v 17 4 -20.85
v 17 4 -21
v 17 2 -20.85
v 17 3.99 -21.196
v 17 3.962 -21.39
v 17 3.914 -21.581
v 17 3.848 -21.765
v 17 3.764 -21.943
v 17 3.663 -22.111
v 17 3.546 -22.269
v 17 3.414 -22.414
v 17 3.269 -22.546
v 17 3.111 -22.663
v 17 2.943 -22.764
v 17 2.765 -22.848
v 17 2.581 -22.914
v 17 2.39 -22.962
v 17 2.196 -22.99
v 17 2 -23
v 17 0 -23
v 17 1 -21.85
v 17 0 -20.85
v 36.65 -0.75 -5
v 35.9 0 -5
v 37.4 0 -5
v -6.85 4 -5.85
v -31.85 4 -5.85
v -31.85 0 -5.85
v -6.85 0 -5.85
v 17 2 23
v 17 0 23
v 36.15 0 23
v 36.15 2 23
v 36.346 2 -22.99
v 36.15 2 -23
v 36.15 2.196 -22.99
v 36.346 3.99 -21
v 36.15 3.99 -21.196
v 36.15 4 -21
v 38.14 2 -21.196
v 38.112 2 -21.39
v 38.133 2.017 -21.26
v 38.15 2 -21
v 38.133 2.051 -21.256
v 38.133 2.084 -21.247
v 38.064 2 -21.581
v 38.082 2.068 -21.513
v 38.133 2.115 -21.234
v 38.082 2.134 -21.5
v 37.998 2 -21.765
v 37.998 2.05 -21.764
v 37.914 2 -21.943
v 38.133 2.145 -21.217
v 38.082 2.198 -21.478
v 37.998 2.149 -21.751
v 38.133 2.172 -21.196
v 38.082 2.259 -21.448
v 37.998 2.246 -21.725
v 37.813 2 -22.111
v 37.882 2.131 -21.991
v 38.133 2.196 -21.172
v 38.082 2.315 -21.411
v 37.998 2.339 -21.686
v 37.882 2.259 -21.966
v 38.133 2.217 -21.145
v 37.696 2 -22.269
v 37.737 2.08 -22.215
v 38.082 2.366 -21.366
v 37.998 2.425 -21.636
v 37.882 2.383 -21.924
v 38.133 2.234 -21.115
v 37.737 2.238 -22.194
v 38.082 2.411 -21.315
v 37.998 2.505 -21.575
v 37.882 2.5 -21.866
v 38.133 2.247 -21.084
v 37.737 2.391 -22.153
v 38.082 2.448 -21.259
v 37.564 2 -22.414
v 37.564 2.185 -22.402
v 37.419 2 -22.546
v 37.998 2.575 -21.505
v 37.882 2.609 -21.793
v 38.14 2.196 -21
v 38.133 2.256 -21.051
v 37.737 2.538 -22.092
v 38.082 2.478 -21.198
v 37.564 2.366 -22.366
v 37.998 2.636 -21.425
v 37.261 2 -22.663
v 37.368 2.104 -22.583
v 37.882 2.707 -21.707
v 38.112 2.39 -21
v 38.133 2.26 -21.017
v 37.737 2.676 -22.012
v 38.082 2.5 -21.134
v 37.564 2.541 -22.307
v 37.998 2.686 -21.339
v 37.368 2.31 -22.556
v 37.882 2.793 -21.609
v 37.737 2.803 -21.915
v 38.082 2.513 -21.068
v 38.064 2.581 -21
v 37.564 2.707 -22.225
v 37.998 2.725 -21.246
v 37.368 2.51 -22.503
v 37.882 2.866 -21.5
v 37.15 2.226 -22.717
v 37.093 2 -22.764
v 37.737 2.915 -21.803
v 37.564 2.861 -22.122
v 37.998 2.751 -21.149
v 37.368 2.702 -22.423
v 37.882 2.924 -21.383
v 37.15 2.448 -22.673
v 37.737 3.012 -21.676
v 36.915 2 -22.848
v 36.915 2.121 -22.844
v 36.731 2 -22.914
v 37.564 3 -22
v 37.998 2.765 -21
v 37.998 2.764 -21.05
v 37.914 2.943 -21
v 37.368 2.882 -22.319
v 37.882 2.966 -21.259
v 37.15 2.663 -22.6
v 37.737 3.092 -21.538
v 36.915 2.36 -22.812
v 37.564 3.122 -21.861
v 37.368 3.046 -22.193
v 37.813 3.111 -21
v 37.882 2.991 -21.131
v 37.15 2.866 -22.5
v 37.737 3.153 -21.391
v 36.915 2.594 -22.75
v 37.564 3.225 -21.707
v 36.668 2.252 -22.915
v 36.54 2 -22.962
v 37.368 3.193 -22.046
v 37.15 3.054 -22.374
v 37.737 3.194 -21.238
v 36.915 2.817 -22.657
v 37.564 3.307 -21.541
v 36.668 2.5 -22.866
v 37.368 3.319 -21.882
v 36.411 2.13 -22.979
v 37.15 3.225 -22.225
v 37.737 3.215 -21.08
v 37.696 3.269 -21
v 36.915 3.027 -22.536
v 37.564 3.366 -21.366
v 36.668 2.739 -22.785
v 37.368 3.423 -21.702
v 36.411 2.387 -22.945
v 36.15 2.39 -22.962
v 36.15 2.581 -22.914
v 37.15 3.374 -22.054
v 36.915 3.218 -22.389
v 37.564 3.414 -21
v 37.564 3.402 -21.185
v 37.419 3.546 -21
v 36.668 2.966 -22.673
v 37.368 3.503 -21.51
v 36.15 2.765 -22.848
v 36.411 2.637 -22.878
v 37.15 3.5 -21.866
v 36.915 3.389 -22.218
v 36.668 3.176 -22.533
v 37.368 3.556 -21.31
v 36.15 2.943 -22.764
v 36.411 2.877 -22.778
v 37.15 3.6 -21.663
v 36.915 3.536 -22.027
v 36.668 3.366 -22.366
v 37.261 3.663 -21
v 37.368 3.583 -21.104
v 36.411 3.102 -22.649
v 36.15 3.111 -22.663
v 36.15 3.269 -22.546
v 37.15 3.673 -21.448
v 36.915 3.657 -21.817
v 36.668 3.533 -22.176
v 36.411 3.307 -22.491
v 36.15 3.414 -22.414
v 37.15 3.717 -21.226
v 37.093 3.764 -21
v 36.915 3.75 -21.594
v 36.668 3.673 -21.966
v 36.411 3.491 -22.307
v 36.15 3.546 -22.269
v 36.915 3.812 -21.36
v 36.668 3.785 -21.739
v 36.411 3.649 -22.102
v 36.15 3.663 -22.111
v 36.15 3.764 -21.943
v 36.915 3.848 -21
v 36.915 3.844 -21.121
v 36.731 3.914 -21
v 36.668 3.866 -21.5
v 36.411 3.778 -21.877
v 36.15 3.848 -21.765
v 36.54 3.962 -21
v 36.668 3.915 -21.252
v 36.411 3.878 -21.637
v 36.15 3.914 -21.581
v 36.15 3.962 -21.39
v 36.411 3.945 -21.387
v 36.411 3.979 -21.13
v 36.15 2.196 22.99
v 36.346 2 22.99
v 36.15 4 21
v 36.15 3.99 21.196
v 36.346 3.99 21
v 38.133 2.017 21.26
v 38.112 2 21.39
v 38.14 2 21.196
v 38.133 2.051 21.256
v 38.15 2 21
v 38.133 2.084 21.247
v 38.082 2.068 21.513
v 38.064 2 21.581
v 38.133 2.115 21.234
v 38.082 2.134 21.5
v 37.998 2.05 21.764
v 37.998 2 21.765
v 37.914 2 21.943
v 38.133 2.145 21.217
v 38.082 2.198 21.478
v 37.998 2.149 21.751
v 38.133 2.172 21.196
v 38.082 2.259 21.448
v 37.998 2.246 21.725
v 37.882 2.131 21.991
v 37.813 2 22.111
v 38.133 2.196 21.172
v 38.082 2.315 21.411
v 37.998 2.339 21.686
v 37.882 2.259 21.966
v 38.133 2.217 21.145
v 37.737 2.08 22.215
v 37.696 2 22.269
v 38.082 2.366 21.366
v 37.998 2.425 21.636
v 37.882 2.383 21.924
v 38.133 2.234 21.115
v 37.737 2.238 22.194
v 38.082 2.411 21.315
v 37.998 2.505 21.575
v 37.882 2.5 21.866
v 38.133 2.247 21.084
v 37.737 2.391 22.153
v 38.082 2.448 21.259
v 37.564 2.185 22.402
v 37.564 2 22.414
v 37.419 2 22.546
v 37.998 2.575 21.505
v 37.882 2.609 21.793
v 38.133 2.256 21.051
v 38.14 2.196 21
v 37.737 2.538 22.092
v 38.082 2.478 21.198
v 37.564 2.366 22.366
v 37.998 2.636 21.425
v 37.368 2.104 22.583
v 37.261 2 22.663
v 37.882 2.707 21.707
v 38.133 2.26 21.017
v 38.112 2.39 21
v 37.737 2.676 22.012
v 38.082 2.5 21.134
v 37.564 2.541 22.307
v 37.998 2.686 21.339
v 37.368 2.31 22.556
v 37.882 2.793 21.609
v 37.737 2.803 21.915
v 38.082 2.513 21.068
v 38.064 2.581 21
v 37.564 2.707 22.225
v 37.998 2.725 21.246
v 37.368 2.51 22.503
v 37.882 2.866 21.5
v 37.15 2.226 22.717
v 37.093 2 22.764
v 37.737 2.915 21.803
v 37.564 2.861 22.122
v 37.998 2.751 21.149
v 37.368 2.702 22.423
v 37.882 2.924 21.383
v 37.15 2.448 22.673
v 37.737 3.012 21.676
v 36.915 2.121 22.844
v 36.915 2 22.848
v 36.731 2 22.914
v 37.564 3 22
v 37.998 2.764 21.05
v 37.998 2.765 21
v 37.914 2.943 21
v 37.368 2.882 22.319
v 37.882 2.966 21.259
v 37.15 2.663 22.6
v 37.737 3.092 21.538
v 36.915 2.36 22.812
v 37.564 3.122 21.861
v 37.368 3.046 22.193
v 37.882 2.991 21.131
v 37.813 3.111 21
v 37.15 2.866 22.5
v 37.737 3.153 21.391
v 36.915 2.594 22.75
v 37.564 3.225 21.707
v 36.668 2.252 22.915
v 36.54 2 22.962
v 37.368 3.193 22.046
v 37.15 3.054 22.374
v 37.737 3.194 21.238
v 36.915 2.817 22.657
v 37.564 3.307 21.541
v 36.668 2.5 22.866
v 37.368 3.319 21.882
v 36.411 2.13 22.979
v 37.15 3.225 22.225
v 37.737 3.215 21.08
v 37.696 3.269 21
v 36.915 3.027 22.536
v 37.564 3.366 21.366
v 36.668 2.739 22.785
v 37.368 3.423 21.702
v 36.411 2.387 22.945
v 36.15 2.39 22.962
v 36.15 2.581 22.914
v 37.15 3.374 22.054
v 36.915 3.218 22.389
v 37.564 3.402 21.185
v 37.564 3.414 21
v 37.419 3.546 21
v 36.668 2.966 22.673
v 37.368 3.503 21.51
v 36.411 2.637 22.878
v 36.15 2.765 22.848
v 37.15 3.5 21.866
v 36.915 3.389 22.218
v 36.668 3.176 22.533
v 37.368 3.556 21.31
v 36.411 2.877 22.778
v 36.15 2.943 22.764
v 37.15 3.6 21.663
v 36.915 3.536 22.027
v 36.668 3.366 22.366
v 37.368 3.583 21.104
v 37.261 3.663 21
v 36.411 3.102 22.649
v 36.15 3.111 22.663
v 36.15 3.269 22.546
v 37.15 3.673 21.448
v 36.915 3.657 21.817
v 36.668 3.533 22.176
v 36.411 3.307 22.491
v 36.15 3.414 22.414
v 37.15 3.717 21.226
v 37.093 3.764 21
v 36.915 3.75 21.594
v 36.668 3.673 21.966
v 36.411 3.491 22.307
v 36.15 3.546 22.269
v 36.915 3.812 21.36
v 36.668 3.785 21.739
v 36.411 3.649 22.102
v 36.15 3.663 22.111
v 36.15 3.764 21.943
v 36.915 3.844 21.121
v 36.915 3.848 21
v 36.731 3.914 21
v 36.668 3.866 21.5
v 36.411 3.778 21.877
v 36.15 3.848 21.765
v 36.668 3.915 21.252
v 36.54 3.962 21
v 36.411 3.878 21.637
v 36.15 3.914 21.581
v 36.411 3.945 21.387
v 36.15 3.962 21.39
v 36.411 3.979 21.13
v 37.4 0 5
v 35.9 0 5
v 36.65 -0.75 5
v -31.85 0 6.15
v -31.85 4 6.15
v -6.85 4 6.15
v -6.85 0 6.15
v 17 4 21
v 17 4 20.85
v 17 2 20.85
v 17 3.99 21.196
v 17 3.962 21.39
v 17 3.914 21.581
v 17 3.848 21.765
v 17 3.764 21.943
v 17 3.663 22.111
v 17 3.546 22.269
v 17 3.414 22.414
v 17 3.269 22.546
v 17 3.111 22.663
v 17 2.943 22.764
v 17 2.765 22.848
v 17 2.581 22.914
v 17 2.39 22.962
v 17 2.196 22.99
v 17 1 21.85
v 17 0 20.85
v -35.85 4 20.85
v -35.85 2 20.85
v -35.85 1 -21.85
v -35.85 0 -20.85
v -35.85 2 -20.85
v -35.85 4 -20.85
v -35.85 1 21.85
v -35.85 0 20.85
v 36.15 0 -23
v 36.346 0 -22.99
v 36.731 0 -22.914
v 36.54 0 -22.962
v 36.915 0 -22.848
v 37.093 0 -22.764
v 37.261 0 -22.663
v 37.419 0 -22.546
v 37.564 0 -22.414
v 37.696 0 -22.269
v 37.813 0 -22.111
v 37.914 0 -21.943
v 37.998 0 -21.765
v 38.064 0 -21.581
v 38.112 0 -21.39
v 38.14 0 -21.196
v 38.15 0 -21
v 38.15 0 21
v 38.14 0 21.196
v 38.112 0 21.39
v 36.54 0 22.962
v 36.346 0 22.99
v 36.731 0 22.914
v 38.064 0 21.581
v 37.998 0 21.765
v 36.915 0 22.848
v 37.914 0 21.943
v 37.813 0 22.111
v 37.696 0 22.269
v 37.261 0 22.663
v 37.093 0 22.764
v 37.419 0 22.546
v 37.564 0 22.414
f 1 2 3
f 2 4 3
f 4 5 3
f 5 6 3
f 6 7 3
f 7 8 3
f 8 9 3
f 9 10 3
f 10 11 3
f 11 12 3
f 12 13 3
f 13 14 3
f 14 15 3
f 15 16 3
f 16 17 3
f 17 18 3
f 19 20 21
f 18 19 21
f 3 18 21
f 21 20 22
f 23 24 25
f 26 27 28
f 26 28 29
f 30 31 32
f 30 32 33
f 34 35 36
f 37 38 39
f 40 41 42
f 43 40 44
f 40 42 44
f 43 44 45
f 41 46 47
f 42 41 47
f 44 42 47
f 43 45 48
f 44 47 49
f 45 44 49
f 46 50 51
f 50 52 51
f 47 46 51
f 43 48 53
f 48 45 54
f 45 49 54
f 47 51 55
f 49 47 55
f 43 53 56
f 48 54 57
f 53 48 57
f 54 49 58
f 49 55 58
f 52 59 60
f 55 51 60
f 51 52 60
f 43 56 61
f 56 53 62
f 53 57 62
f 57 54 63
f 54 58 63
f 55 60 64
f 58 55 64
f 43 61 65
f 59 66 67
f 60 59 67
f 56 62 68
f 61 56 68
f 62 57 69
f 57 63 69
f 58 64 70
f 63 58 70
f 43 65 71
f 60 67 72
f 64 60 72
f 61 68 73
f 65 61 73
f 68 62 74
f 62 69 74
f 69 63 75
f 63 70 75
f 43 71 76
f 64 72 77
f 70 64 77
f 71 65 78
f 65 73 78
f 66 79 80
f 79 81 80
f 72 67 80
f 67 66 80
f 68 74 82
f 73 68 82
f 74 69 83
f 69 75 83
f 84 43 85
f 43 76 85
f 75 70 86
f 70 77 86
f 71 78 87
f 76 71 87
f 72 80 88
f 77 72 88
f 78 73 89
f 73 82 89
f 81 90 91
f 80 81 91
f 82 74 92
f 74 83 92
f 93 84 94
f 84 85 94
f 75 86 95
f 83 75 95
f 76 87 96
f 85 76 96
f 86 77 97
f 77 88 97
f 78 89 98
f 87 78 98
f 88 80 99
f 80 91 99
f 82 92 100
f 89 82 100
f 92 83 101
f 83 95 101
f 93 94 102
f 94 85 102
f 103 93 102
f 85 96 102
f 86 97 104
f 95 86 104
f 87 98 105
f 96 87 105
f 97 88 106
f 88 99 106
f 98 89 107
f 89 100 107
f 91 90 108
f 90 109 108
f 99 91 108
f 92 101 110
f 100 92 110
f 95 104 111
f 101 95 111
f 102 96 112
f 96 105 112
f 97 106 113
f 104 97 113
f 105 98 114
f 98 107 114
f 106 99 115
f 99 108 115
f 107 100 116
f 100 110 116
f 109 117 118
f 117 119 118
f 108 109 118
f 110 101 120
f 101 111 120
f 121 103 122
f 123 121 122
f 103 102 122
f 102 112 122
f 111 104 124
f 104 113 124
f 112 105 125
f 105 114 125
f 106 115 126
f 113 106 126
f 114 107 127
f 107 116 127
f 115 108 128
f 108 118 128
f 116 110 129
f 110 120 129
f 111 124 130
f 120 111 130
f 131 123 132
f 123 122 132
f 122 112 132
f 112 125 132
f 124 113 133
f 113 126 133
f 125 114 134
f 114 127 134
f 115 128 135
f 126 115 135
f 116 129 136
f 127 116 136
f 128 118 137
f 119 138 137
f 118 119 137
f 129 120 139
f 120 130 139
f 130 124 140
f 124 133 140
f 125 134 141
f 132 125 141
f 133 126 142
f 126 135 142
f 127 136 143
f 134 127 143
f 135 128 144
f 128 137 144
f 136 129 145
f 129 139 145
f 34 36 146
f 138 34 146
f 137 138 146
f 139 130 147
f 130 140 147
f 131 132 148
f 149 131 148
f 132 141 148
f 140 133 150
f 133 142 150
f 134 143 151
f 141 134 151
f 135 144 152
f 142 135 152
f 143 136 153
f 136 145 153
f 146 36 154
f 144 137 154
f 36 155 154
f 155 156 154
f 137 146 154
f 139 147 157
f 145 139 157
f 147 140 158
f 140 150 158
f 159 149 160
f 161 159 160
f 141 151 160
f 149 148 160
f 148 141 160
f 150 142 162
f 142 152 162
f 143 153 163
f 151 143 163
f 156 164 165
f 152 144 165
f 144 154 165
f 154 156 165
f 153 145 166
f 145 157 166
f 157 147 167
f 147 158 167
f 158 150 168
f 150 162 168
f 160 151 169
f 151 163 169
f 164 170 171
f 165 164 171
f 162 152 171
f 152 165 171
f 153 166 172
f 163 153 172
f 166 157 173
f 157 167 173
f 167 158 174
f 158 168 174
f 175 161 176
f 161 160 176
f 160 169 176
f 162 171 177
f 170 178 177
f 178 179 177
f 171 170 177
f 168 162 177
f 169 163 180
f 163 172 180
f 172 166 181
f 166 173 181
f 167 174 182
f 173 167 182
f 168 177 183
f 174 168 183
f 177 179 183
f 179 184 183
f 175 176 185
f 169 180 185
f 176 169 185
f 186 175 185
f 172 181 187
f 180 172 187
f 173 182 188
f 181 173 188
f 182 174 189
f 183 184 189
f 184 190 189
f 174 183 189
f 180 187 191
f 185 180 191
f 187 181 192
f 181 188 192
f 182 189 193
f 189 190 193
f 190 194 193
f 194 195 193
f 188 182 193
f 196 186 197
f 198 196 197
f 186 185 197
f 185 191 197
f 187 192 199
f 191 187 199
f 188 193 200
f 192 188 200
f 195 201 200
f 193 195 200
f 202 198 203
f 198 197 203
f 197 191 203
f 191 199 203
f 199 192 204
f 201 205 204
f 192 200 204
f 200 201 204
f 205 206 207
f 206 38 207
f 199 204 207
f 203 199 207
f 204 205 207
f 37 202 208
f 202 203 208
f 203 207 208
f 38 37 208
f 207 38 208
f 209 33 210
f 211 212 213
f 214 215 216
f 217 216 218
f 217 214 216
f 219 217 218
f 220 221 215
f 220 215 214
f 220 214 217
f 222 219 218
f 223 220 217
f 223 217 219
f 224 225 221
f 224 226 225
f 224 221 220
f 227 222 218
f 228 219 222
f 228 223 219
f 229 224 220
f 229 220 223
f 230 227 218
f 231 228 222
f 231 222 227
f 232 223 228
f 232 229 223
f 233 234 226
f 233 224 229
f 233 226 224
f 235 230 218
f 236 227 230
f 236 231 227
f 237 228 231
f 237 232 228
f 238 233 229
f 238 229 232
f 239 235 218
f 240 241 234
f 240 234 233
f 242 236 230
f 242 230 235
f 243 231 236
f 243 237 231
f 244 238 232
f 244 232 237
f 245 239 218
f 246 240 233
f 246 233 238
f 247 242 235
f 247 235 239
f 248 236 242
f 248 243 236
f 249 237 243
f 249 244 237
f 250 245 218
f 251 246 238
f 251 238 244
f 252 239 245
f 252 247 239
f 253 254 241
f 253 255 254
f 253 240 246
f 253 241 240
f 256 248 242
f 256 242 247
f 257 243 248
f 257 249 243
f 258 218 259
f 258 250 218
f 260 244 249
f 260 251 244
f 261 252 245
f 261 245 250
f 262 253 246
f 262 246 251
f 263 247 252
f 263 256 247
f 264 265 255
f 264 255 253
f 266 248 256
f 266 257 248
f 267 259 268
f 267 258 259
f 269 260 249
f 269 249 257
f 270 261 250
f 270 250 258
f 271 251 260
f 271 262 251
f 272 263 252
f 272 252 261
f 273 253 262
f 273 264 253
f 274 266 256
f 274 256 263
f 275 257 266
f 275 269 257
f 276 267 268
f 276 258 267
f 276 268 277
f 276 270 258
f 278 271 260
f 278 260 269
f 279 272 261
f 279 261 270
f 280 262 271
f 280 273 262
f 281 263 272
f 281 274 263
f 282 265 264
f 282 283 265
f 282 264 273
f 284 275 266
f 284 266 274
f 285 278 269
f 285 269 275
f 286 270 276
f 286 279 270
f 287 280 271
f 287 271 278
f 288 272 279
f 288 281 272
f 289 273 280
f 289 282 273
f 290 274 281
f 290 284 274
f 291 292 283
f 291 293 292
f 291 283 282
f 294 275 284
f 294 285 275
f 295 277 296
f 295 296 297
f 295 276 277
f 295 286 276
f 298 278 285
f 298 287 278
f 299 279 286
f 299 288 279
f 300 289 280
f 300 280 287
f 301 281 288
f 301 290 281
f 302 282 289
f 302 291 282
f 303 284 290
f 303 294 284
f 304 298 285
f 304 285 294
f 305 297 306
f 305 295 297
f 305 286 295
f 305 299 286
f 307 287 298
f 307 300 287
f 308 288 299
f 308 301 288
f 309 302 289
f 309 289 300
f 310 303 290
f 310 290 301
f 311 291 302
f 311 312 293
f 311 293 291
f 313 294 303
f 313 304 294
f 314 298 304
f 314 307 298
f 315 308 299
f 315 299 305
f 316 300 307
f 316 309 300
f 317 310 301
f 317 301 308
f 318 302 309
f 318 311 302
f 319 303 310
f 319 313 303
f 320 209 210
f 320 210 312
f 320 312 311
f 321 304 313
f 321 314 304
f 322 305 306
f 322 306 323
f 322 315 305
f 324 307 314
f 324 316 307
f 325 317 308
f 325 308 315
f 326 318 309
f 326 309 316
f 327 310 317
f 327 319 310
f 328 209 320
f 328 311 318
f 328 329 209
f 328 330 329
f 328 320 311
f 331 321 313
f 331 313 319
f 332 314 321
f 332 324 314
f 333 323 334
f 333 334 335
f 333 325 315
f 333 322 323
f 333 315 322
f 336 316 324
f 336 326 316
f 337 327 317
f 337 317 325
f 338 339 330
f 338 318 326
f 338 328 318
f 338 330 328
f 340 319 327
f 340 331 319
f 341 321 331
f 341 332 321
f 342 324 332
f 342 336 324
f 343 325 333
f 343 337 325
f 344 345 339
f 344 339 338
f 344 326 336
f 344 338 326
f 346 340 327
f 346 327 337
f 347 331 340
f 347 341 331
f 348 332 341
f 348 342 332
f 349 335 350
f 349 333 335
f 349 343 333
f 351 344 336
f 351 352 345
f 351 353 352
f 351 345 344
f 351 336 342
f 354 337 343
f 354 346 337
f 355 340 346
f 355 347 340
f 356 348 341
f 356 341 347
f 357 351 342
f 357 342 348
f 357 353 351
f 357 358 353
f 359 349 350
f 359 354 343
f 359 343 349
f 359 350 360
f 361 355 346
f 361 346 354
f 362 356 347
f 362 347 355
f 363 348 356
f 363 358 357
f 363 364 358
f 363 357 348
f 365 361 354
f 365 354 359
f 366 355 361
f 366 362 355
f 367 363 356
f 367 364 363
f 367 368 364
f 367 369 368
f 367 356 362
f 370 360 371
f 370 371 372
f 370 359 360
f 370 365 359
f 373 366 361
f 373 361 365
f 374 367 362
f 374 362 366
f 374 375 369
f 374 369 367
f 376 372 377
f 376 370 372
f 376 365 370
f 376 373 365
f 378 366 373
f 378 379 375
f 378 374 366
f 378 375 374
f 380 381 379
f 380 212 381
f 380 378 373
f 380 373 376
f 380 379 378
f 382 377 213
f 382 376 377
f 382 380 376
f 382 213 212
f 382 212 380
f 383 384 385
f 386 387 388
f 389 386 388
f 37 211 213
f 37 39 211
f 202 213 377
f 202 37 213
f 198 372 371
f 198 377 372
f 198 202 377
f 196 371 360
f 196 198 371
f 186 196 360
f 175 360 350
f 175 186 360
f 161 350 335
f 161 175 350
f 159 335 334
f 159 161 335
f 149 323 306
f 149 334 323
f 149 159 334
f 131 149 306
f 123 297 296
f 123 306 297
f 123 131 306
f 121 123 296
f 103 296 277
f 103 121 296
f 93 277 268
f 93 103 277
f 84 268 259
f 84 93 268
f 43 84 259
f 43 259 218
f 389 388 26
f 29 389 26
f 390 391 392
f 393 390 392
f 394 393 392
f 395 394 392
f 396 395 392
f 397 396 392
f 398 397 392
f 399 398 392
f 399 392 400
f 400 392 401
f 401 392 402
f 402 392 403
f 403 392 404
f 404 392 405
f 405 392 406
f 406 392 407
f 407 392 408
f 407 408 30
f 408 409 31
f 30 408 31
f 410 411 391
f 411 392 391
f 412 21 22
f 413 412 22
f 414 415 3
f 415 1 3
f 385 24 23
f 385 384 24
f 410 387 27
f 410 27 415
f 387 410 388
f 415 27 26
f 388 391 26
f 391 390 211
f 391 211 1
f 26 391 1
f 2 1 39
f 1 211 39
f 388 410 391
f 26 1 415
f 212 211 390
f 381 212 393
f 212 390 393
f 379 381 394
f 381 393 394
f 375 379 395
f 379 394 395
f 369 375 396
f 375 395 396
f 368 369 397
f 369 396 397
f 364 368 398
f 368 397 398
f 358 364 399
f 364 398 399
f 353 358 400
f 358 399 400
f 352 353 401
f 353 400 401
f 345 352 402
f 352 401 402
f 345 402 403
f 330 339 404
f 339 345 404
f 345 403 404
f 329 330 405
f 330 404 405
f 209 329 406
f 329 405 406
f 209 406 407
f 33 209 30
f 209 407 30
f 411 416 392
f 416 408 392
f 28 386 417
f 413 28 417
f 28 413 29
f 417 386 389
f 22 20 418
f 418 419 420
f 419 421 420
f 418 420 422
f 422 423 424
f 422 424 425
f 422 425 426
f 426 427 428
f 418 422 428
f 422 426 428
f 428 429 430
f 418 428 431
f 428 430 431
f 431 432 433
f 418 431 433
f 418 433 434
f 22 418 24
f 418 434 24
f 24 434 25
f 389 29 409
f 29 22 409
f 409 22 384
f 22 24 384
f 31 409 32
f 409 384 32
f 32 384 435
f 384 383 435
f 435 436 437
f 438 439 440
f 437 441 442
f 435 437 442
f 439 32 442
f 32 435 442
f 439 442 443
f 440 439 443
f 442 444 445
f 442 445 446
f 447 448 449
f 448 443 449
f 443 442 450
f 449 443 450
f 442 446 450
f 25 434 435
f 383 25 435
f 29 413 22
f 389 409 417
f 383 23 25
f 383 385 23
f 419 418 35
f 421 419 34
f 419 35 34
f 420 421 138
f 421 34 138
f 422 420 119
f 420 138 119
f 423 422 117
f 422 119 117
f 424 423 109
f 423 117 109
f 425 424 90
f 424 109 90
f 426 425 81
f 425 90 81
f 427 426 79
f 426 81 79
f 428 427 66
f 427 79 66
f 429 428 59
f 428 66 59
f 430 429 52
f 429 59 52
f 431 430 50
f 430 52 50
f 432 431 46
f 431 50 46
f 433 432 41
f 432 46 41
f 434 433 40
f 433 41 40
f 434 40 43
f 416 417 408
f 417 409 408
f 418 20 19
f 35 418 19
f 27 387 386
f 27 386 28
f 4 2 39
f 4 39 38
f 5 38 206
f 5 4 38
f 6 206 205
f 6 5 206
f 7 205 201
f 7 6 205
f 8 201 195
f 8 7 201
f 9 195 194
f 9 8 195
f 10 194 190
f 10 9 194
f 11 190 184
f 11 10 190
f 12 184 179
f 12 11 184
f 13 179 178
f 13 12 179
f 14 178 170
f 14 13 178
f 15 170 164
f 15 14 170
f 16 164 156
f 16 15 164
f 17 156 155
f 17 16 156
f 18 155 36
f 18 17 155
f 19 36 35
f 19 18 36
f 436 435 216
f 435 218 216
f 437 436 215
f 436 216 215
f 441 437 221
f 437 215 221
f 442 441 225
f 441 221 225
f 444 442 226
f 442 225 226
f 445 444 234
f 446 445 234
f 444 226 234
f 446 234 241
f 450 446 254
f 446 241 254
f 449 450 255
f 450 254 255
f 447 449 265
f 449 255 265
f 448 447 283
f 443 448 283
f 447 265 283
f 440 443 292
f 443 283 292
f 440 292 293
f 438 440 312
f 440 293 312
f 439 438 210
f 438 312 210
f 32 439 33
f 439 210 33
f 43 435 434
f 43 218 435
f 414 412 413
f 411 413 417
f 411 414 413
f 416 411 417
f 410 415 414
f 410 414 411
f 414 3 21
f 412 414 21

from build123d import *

# Parameters (mm, degrees)
EXTRUDE_2_DEPTH     = 4
EXTRUDE_3_DEPTH     = 51.85
EXTRUDE_4_DEPTH     = 51.85
SKETCH_6_W          = 25
SKETCH_6_H          = 12
CUT_EXTRUDE_1_DEPTH = 4
SKETCH_7_W          = 46
SKETCH_7_H          = 4
EXTRUDE_5_DEPTH     = 1.15
EXTRUDE_6_DEPTH     = 5
EXTRUDE_7_DEPTH     = 1
FILLET_3_R          = 2


with BuildPart() as part:
    # 草图1 → 凸台-拉伸2 (new body)
    with BuildSketch(Plane(origin=(0, 0, 0), x_dir=(1, 0, 0), z_dir=(0, 1, 0))):
        Polygon((16.85, -20.85), (17, -20.85), (17, 20.85), (16.85, 20.85), (-34.85, 20.85), (-34.85, -20.85), align=None)
        Polygon((17, -20.85), (17, -21), (31, -21), (35, -21), (35, -18), (35, 18), (35, 21), (31, 21), (17, 21), (17, 20.85), align=None)
        Polygon((31, -21), (17, -21), (17, -23), (37, -23), (37, 23), (17, 23), (17, 21), (31, 21), (35, 21), (35, 18), (35, -18), (35, -21), align=None)
    extrude(amount=EXTRUDE_2_DEPTH)

    # 草图4 → 凸台-拉伸3 (add)
    with BuildSketch(Plane.ZY.offset(-17)):
        Polygon((-20.85, 2), (-21.85, 1), (-20.85, 0), align=None)
    extrude(amount=EXTRUDE_3_DEPTH)

    # 草图3 → 凸台-拉伸4 (add)
    with BuildSketch(Plane.ZY.offset(-17)):
        Polygon((20.85, 2), (21.85, 1), (20.85, 0), align=None)
    extrude(amount=EXTRUDE_4_DEPTH)

    # 草图6 → 切除-拉伸1 (cut)
    with BuildSketch(Plane(origin=(0, 4, 0), x_dir=(1, 0, 0), z_dir=(0, 1, 0))):
        with Locations((-19.35, -0.15)):
            Rectangle(SKETCH_6_W, SKETCH_6_H)
    extrude(amount=-CUT_EXTRUDE_1_DEPTH, mode=Mode.SUBTRACT)

    # 草图7 → 凸台-拉伸5 (add)
    with BuildSketch(Plane(origin=(37, 0, 0), x_dir=(0, 0, -1), z_dir=(1, 0, 0))):
        with Locations((0, 2)):
            Rectangle(SKETCH_7_W, SKETCH_7_H)
    extrude(amount=EXTRUDE_5_DEPTH)

    # 草图12 → 凸台-拉伸6 (add, symmetric)
    with BuildSketch(Plane.XY):
        Polygon((36.65, 0), (36.65, -0.75), (37.4, 0), align=None)
        Polygon((35.9, 0), (36.65, -0.75), (36.65, 0), align=None)
    extrude(amount=EXTRUDE_6_DEPTH, both=True)

    # 草图14 → 凸台-拉伸7 (add)
    with BuildSketch(Plane.ZY.offset(34.85)):
        Polygon((-20.85, 0), (20.85, 0), (21.85, 1), (20.85, 2), (20.85, 4), (-20.85, 4), (-20.85, 2), (-21.85, 1), align=None)
    extrude(amount=EXTRUDE_7_DEPTH)

    # 圆角3
    fillet_3_edges = [part.edges().sort_by_distance(p)[0] for p in [
        (27.575, 4, 23),
        (27.575, 4, -23),
        (38.15, 2, 23),
        (38.15, 2, -23),
        (38.15, 4, 0),
    ]]
    fillet(fillet_3_edges, radius=FILLET_3_R)


solid = part.part
